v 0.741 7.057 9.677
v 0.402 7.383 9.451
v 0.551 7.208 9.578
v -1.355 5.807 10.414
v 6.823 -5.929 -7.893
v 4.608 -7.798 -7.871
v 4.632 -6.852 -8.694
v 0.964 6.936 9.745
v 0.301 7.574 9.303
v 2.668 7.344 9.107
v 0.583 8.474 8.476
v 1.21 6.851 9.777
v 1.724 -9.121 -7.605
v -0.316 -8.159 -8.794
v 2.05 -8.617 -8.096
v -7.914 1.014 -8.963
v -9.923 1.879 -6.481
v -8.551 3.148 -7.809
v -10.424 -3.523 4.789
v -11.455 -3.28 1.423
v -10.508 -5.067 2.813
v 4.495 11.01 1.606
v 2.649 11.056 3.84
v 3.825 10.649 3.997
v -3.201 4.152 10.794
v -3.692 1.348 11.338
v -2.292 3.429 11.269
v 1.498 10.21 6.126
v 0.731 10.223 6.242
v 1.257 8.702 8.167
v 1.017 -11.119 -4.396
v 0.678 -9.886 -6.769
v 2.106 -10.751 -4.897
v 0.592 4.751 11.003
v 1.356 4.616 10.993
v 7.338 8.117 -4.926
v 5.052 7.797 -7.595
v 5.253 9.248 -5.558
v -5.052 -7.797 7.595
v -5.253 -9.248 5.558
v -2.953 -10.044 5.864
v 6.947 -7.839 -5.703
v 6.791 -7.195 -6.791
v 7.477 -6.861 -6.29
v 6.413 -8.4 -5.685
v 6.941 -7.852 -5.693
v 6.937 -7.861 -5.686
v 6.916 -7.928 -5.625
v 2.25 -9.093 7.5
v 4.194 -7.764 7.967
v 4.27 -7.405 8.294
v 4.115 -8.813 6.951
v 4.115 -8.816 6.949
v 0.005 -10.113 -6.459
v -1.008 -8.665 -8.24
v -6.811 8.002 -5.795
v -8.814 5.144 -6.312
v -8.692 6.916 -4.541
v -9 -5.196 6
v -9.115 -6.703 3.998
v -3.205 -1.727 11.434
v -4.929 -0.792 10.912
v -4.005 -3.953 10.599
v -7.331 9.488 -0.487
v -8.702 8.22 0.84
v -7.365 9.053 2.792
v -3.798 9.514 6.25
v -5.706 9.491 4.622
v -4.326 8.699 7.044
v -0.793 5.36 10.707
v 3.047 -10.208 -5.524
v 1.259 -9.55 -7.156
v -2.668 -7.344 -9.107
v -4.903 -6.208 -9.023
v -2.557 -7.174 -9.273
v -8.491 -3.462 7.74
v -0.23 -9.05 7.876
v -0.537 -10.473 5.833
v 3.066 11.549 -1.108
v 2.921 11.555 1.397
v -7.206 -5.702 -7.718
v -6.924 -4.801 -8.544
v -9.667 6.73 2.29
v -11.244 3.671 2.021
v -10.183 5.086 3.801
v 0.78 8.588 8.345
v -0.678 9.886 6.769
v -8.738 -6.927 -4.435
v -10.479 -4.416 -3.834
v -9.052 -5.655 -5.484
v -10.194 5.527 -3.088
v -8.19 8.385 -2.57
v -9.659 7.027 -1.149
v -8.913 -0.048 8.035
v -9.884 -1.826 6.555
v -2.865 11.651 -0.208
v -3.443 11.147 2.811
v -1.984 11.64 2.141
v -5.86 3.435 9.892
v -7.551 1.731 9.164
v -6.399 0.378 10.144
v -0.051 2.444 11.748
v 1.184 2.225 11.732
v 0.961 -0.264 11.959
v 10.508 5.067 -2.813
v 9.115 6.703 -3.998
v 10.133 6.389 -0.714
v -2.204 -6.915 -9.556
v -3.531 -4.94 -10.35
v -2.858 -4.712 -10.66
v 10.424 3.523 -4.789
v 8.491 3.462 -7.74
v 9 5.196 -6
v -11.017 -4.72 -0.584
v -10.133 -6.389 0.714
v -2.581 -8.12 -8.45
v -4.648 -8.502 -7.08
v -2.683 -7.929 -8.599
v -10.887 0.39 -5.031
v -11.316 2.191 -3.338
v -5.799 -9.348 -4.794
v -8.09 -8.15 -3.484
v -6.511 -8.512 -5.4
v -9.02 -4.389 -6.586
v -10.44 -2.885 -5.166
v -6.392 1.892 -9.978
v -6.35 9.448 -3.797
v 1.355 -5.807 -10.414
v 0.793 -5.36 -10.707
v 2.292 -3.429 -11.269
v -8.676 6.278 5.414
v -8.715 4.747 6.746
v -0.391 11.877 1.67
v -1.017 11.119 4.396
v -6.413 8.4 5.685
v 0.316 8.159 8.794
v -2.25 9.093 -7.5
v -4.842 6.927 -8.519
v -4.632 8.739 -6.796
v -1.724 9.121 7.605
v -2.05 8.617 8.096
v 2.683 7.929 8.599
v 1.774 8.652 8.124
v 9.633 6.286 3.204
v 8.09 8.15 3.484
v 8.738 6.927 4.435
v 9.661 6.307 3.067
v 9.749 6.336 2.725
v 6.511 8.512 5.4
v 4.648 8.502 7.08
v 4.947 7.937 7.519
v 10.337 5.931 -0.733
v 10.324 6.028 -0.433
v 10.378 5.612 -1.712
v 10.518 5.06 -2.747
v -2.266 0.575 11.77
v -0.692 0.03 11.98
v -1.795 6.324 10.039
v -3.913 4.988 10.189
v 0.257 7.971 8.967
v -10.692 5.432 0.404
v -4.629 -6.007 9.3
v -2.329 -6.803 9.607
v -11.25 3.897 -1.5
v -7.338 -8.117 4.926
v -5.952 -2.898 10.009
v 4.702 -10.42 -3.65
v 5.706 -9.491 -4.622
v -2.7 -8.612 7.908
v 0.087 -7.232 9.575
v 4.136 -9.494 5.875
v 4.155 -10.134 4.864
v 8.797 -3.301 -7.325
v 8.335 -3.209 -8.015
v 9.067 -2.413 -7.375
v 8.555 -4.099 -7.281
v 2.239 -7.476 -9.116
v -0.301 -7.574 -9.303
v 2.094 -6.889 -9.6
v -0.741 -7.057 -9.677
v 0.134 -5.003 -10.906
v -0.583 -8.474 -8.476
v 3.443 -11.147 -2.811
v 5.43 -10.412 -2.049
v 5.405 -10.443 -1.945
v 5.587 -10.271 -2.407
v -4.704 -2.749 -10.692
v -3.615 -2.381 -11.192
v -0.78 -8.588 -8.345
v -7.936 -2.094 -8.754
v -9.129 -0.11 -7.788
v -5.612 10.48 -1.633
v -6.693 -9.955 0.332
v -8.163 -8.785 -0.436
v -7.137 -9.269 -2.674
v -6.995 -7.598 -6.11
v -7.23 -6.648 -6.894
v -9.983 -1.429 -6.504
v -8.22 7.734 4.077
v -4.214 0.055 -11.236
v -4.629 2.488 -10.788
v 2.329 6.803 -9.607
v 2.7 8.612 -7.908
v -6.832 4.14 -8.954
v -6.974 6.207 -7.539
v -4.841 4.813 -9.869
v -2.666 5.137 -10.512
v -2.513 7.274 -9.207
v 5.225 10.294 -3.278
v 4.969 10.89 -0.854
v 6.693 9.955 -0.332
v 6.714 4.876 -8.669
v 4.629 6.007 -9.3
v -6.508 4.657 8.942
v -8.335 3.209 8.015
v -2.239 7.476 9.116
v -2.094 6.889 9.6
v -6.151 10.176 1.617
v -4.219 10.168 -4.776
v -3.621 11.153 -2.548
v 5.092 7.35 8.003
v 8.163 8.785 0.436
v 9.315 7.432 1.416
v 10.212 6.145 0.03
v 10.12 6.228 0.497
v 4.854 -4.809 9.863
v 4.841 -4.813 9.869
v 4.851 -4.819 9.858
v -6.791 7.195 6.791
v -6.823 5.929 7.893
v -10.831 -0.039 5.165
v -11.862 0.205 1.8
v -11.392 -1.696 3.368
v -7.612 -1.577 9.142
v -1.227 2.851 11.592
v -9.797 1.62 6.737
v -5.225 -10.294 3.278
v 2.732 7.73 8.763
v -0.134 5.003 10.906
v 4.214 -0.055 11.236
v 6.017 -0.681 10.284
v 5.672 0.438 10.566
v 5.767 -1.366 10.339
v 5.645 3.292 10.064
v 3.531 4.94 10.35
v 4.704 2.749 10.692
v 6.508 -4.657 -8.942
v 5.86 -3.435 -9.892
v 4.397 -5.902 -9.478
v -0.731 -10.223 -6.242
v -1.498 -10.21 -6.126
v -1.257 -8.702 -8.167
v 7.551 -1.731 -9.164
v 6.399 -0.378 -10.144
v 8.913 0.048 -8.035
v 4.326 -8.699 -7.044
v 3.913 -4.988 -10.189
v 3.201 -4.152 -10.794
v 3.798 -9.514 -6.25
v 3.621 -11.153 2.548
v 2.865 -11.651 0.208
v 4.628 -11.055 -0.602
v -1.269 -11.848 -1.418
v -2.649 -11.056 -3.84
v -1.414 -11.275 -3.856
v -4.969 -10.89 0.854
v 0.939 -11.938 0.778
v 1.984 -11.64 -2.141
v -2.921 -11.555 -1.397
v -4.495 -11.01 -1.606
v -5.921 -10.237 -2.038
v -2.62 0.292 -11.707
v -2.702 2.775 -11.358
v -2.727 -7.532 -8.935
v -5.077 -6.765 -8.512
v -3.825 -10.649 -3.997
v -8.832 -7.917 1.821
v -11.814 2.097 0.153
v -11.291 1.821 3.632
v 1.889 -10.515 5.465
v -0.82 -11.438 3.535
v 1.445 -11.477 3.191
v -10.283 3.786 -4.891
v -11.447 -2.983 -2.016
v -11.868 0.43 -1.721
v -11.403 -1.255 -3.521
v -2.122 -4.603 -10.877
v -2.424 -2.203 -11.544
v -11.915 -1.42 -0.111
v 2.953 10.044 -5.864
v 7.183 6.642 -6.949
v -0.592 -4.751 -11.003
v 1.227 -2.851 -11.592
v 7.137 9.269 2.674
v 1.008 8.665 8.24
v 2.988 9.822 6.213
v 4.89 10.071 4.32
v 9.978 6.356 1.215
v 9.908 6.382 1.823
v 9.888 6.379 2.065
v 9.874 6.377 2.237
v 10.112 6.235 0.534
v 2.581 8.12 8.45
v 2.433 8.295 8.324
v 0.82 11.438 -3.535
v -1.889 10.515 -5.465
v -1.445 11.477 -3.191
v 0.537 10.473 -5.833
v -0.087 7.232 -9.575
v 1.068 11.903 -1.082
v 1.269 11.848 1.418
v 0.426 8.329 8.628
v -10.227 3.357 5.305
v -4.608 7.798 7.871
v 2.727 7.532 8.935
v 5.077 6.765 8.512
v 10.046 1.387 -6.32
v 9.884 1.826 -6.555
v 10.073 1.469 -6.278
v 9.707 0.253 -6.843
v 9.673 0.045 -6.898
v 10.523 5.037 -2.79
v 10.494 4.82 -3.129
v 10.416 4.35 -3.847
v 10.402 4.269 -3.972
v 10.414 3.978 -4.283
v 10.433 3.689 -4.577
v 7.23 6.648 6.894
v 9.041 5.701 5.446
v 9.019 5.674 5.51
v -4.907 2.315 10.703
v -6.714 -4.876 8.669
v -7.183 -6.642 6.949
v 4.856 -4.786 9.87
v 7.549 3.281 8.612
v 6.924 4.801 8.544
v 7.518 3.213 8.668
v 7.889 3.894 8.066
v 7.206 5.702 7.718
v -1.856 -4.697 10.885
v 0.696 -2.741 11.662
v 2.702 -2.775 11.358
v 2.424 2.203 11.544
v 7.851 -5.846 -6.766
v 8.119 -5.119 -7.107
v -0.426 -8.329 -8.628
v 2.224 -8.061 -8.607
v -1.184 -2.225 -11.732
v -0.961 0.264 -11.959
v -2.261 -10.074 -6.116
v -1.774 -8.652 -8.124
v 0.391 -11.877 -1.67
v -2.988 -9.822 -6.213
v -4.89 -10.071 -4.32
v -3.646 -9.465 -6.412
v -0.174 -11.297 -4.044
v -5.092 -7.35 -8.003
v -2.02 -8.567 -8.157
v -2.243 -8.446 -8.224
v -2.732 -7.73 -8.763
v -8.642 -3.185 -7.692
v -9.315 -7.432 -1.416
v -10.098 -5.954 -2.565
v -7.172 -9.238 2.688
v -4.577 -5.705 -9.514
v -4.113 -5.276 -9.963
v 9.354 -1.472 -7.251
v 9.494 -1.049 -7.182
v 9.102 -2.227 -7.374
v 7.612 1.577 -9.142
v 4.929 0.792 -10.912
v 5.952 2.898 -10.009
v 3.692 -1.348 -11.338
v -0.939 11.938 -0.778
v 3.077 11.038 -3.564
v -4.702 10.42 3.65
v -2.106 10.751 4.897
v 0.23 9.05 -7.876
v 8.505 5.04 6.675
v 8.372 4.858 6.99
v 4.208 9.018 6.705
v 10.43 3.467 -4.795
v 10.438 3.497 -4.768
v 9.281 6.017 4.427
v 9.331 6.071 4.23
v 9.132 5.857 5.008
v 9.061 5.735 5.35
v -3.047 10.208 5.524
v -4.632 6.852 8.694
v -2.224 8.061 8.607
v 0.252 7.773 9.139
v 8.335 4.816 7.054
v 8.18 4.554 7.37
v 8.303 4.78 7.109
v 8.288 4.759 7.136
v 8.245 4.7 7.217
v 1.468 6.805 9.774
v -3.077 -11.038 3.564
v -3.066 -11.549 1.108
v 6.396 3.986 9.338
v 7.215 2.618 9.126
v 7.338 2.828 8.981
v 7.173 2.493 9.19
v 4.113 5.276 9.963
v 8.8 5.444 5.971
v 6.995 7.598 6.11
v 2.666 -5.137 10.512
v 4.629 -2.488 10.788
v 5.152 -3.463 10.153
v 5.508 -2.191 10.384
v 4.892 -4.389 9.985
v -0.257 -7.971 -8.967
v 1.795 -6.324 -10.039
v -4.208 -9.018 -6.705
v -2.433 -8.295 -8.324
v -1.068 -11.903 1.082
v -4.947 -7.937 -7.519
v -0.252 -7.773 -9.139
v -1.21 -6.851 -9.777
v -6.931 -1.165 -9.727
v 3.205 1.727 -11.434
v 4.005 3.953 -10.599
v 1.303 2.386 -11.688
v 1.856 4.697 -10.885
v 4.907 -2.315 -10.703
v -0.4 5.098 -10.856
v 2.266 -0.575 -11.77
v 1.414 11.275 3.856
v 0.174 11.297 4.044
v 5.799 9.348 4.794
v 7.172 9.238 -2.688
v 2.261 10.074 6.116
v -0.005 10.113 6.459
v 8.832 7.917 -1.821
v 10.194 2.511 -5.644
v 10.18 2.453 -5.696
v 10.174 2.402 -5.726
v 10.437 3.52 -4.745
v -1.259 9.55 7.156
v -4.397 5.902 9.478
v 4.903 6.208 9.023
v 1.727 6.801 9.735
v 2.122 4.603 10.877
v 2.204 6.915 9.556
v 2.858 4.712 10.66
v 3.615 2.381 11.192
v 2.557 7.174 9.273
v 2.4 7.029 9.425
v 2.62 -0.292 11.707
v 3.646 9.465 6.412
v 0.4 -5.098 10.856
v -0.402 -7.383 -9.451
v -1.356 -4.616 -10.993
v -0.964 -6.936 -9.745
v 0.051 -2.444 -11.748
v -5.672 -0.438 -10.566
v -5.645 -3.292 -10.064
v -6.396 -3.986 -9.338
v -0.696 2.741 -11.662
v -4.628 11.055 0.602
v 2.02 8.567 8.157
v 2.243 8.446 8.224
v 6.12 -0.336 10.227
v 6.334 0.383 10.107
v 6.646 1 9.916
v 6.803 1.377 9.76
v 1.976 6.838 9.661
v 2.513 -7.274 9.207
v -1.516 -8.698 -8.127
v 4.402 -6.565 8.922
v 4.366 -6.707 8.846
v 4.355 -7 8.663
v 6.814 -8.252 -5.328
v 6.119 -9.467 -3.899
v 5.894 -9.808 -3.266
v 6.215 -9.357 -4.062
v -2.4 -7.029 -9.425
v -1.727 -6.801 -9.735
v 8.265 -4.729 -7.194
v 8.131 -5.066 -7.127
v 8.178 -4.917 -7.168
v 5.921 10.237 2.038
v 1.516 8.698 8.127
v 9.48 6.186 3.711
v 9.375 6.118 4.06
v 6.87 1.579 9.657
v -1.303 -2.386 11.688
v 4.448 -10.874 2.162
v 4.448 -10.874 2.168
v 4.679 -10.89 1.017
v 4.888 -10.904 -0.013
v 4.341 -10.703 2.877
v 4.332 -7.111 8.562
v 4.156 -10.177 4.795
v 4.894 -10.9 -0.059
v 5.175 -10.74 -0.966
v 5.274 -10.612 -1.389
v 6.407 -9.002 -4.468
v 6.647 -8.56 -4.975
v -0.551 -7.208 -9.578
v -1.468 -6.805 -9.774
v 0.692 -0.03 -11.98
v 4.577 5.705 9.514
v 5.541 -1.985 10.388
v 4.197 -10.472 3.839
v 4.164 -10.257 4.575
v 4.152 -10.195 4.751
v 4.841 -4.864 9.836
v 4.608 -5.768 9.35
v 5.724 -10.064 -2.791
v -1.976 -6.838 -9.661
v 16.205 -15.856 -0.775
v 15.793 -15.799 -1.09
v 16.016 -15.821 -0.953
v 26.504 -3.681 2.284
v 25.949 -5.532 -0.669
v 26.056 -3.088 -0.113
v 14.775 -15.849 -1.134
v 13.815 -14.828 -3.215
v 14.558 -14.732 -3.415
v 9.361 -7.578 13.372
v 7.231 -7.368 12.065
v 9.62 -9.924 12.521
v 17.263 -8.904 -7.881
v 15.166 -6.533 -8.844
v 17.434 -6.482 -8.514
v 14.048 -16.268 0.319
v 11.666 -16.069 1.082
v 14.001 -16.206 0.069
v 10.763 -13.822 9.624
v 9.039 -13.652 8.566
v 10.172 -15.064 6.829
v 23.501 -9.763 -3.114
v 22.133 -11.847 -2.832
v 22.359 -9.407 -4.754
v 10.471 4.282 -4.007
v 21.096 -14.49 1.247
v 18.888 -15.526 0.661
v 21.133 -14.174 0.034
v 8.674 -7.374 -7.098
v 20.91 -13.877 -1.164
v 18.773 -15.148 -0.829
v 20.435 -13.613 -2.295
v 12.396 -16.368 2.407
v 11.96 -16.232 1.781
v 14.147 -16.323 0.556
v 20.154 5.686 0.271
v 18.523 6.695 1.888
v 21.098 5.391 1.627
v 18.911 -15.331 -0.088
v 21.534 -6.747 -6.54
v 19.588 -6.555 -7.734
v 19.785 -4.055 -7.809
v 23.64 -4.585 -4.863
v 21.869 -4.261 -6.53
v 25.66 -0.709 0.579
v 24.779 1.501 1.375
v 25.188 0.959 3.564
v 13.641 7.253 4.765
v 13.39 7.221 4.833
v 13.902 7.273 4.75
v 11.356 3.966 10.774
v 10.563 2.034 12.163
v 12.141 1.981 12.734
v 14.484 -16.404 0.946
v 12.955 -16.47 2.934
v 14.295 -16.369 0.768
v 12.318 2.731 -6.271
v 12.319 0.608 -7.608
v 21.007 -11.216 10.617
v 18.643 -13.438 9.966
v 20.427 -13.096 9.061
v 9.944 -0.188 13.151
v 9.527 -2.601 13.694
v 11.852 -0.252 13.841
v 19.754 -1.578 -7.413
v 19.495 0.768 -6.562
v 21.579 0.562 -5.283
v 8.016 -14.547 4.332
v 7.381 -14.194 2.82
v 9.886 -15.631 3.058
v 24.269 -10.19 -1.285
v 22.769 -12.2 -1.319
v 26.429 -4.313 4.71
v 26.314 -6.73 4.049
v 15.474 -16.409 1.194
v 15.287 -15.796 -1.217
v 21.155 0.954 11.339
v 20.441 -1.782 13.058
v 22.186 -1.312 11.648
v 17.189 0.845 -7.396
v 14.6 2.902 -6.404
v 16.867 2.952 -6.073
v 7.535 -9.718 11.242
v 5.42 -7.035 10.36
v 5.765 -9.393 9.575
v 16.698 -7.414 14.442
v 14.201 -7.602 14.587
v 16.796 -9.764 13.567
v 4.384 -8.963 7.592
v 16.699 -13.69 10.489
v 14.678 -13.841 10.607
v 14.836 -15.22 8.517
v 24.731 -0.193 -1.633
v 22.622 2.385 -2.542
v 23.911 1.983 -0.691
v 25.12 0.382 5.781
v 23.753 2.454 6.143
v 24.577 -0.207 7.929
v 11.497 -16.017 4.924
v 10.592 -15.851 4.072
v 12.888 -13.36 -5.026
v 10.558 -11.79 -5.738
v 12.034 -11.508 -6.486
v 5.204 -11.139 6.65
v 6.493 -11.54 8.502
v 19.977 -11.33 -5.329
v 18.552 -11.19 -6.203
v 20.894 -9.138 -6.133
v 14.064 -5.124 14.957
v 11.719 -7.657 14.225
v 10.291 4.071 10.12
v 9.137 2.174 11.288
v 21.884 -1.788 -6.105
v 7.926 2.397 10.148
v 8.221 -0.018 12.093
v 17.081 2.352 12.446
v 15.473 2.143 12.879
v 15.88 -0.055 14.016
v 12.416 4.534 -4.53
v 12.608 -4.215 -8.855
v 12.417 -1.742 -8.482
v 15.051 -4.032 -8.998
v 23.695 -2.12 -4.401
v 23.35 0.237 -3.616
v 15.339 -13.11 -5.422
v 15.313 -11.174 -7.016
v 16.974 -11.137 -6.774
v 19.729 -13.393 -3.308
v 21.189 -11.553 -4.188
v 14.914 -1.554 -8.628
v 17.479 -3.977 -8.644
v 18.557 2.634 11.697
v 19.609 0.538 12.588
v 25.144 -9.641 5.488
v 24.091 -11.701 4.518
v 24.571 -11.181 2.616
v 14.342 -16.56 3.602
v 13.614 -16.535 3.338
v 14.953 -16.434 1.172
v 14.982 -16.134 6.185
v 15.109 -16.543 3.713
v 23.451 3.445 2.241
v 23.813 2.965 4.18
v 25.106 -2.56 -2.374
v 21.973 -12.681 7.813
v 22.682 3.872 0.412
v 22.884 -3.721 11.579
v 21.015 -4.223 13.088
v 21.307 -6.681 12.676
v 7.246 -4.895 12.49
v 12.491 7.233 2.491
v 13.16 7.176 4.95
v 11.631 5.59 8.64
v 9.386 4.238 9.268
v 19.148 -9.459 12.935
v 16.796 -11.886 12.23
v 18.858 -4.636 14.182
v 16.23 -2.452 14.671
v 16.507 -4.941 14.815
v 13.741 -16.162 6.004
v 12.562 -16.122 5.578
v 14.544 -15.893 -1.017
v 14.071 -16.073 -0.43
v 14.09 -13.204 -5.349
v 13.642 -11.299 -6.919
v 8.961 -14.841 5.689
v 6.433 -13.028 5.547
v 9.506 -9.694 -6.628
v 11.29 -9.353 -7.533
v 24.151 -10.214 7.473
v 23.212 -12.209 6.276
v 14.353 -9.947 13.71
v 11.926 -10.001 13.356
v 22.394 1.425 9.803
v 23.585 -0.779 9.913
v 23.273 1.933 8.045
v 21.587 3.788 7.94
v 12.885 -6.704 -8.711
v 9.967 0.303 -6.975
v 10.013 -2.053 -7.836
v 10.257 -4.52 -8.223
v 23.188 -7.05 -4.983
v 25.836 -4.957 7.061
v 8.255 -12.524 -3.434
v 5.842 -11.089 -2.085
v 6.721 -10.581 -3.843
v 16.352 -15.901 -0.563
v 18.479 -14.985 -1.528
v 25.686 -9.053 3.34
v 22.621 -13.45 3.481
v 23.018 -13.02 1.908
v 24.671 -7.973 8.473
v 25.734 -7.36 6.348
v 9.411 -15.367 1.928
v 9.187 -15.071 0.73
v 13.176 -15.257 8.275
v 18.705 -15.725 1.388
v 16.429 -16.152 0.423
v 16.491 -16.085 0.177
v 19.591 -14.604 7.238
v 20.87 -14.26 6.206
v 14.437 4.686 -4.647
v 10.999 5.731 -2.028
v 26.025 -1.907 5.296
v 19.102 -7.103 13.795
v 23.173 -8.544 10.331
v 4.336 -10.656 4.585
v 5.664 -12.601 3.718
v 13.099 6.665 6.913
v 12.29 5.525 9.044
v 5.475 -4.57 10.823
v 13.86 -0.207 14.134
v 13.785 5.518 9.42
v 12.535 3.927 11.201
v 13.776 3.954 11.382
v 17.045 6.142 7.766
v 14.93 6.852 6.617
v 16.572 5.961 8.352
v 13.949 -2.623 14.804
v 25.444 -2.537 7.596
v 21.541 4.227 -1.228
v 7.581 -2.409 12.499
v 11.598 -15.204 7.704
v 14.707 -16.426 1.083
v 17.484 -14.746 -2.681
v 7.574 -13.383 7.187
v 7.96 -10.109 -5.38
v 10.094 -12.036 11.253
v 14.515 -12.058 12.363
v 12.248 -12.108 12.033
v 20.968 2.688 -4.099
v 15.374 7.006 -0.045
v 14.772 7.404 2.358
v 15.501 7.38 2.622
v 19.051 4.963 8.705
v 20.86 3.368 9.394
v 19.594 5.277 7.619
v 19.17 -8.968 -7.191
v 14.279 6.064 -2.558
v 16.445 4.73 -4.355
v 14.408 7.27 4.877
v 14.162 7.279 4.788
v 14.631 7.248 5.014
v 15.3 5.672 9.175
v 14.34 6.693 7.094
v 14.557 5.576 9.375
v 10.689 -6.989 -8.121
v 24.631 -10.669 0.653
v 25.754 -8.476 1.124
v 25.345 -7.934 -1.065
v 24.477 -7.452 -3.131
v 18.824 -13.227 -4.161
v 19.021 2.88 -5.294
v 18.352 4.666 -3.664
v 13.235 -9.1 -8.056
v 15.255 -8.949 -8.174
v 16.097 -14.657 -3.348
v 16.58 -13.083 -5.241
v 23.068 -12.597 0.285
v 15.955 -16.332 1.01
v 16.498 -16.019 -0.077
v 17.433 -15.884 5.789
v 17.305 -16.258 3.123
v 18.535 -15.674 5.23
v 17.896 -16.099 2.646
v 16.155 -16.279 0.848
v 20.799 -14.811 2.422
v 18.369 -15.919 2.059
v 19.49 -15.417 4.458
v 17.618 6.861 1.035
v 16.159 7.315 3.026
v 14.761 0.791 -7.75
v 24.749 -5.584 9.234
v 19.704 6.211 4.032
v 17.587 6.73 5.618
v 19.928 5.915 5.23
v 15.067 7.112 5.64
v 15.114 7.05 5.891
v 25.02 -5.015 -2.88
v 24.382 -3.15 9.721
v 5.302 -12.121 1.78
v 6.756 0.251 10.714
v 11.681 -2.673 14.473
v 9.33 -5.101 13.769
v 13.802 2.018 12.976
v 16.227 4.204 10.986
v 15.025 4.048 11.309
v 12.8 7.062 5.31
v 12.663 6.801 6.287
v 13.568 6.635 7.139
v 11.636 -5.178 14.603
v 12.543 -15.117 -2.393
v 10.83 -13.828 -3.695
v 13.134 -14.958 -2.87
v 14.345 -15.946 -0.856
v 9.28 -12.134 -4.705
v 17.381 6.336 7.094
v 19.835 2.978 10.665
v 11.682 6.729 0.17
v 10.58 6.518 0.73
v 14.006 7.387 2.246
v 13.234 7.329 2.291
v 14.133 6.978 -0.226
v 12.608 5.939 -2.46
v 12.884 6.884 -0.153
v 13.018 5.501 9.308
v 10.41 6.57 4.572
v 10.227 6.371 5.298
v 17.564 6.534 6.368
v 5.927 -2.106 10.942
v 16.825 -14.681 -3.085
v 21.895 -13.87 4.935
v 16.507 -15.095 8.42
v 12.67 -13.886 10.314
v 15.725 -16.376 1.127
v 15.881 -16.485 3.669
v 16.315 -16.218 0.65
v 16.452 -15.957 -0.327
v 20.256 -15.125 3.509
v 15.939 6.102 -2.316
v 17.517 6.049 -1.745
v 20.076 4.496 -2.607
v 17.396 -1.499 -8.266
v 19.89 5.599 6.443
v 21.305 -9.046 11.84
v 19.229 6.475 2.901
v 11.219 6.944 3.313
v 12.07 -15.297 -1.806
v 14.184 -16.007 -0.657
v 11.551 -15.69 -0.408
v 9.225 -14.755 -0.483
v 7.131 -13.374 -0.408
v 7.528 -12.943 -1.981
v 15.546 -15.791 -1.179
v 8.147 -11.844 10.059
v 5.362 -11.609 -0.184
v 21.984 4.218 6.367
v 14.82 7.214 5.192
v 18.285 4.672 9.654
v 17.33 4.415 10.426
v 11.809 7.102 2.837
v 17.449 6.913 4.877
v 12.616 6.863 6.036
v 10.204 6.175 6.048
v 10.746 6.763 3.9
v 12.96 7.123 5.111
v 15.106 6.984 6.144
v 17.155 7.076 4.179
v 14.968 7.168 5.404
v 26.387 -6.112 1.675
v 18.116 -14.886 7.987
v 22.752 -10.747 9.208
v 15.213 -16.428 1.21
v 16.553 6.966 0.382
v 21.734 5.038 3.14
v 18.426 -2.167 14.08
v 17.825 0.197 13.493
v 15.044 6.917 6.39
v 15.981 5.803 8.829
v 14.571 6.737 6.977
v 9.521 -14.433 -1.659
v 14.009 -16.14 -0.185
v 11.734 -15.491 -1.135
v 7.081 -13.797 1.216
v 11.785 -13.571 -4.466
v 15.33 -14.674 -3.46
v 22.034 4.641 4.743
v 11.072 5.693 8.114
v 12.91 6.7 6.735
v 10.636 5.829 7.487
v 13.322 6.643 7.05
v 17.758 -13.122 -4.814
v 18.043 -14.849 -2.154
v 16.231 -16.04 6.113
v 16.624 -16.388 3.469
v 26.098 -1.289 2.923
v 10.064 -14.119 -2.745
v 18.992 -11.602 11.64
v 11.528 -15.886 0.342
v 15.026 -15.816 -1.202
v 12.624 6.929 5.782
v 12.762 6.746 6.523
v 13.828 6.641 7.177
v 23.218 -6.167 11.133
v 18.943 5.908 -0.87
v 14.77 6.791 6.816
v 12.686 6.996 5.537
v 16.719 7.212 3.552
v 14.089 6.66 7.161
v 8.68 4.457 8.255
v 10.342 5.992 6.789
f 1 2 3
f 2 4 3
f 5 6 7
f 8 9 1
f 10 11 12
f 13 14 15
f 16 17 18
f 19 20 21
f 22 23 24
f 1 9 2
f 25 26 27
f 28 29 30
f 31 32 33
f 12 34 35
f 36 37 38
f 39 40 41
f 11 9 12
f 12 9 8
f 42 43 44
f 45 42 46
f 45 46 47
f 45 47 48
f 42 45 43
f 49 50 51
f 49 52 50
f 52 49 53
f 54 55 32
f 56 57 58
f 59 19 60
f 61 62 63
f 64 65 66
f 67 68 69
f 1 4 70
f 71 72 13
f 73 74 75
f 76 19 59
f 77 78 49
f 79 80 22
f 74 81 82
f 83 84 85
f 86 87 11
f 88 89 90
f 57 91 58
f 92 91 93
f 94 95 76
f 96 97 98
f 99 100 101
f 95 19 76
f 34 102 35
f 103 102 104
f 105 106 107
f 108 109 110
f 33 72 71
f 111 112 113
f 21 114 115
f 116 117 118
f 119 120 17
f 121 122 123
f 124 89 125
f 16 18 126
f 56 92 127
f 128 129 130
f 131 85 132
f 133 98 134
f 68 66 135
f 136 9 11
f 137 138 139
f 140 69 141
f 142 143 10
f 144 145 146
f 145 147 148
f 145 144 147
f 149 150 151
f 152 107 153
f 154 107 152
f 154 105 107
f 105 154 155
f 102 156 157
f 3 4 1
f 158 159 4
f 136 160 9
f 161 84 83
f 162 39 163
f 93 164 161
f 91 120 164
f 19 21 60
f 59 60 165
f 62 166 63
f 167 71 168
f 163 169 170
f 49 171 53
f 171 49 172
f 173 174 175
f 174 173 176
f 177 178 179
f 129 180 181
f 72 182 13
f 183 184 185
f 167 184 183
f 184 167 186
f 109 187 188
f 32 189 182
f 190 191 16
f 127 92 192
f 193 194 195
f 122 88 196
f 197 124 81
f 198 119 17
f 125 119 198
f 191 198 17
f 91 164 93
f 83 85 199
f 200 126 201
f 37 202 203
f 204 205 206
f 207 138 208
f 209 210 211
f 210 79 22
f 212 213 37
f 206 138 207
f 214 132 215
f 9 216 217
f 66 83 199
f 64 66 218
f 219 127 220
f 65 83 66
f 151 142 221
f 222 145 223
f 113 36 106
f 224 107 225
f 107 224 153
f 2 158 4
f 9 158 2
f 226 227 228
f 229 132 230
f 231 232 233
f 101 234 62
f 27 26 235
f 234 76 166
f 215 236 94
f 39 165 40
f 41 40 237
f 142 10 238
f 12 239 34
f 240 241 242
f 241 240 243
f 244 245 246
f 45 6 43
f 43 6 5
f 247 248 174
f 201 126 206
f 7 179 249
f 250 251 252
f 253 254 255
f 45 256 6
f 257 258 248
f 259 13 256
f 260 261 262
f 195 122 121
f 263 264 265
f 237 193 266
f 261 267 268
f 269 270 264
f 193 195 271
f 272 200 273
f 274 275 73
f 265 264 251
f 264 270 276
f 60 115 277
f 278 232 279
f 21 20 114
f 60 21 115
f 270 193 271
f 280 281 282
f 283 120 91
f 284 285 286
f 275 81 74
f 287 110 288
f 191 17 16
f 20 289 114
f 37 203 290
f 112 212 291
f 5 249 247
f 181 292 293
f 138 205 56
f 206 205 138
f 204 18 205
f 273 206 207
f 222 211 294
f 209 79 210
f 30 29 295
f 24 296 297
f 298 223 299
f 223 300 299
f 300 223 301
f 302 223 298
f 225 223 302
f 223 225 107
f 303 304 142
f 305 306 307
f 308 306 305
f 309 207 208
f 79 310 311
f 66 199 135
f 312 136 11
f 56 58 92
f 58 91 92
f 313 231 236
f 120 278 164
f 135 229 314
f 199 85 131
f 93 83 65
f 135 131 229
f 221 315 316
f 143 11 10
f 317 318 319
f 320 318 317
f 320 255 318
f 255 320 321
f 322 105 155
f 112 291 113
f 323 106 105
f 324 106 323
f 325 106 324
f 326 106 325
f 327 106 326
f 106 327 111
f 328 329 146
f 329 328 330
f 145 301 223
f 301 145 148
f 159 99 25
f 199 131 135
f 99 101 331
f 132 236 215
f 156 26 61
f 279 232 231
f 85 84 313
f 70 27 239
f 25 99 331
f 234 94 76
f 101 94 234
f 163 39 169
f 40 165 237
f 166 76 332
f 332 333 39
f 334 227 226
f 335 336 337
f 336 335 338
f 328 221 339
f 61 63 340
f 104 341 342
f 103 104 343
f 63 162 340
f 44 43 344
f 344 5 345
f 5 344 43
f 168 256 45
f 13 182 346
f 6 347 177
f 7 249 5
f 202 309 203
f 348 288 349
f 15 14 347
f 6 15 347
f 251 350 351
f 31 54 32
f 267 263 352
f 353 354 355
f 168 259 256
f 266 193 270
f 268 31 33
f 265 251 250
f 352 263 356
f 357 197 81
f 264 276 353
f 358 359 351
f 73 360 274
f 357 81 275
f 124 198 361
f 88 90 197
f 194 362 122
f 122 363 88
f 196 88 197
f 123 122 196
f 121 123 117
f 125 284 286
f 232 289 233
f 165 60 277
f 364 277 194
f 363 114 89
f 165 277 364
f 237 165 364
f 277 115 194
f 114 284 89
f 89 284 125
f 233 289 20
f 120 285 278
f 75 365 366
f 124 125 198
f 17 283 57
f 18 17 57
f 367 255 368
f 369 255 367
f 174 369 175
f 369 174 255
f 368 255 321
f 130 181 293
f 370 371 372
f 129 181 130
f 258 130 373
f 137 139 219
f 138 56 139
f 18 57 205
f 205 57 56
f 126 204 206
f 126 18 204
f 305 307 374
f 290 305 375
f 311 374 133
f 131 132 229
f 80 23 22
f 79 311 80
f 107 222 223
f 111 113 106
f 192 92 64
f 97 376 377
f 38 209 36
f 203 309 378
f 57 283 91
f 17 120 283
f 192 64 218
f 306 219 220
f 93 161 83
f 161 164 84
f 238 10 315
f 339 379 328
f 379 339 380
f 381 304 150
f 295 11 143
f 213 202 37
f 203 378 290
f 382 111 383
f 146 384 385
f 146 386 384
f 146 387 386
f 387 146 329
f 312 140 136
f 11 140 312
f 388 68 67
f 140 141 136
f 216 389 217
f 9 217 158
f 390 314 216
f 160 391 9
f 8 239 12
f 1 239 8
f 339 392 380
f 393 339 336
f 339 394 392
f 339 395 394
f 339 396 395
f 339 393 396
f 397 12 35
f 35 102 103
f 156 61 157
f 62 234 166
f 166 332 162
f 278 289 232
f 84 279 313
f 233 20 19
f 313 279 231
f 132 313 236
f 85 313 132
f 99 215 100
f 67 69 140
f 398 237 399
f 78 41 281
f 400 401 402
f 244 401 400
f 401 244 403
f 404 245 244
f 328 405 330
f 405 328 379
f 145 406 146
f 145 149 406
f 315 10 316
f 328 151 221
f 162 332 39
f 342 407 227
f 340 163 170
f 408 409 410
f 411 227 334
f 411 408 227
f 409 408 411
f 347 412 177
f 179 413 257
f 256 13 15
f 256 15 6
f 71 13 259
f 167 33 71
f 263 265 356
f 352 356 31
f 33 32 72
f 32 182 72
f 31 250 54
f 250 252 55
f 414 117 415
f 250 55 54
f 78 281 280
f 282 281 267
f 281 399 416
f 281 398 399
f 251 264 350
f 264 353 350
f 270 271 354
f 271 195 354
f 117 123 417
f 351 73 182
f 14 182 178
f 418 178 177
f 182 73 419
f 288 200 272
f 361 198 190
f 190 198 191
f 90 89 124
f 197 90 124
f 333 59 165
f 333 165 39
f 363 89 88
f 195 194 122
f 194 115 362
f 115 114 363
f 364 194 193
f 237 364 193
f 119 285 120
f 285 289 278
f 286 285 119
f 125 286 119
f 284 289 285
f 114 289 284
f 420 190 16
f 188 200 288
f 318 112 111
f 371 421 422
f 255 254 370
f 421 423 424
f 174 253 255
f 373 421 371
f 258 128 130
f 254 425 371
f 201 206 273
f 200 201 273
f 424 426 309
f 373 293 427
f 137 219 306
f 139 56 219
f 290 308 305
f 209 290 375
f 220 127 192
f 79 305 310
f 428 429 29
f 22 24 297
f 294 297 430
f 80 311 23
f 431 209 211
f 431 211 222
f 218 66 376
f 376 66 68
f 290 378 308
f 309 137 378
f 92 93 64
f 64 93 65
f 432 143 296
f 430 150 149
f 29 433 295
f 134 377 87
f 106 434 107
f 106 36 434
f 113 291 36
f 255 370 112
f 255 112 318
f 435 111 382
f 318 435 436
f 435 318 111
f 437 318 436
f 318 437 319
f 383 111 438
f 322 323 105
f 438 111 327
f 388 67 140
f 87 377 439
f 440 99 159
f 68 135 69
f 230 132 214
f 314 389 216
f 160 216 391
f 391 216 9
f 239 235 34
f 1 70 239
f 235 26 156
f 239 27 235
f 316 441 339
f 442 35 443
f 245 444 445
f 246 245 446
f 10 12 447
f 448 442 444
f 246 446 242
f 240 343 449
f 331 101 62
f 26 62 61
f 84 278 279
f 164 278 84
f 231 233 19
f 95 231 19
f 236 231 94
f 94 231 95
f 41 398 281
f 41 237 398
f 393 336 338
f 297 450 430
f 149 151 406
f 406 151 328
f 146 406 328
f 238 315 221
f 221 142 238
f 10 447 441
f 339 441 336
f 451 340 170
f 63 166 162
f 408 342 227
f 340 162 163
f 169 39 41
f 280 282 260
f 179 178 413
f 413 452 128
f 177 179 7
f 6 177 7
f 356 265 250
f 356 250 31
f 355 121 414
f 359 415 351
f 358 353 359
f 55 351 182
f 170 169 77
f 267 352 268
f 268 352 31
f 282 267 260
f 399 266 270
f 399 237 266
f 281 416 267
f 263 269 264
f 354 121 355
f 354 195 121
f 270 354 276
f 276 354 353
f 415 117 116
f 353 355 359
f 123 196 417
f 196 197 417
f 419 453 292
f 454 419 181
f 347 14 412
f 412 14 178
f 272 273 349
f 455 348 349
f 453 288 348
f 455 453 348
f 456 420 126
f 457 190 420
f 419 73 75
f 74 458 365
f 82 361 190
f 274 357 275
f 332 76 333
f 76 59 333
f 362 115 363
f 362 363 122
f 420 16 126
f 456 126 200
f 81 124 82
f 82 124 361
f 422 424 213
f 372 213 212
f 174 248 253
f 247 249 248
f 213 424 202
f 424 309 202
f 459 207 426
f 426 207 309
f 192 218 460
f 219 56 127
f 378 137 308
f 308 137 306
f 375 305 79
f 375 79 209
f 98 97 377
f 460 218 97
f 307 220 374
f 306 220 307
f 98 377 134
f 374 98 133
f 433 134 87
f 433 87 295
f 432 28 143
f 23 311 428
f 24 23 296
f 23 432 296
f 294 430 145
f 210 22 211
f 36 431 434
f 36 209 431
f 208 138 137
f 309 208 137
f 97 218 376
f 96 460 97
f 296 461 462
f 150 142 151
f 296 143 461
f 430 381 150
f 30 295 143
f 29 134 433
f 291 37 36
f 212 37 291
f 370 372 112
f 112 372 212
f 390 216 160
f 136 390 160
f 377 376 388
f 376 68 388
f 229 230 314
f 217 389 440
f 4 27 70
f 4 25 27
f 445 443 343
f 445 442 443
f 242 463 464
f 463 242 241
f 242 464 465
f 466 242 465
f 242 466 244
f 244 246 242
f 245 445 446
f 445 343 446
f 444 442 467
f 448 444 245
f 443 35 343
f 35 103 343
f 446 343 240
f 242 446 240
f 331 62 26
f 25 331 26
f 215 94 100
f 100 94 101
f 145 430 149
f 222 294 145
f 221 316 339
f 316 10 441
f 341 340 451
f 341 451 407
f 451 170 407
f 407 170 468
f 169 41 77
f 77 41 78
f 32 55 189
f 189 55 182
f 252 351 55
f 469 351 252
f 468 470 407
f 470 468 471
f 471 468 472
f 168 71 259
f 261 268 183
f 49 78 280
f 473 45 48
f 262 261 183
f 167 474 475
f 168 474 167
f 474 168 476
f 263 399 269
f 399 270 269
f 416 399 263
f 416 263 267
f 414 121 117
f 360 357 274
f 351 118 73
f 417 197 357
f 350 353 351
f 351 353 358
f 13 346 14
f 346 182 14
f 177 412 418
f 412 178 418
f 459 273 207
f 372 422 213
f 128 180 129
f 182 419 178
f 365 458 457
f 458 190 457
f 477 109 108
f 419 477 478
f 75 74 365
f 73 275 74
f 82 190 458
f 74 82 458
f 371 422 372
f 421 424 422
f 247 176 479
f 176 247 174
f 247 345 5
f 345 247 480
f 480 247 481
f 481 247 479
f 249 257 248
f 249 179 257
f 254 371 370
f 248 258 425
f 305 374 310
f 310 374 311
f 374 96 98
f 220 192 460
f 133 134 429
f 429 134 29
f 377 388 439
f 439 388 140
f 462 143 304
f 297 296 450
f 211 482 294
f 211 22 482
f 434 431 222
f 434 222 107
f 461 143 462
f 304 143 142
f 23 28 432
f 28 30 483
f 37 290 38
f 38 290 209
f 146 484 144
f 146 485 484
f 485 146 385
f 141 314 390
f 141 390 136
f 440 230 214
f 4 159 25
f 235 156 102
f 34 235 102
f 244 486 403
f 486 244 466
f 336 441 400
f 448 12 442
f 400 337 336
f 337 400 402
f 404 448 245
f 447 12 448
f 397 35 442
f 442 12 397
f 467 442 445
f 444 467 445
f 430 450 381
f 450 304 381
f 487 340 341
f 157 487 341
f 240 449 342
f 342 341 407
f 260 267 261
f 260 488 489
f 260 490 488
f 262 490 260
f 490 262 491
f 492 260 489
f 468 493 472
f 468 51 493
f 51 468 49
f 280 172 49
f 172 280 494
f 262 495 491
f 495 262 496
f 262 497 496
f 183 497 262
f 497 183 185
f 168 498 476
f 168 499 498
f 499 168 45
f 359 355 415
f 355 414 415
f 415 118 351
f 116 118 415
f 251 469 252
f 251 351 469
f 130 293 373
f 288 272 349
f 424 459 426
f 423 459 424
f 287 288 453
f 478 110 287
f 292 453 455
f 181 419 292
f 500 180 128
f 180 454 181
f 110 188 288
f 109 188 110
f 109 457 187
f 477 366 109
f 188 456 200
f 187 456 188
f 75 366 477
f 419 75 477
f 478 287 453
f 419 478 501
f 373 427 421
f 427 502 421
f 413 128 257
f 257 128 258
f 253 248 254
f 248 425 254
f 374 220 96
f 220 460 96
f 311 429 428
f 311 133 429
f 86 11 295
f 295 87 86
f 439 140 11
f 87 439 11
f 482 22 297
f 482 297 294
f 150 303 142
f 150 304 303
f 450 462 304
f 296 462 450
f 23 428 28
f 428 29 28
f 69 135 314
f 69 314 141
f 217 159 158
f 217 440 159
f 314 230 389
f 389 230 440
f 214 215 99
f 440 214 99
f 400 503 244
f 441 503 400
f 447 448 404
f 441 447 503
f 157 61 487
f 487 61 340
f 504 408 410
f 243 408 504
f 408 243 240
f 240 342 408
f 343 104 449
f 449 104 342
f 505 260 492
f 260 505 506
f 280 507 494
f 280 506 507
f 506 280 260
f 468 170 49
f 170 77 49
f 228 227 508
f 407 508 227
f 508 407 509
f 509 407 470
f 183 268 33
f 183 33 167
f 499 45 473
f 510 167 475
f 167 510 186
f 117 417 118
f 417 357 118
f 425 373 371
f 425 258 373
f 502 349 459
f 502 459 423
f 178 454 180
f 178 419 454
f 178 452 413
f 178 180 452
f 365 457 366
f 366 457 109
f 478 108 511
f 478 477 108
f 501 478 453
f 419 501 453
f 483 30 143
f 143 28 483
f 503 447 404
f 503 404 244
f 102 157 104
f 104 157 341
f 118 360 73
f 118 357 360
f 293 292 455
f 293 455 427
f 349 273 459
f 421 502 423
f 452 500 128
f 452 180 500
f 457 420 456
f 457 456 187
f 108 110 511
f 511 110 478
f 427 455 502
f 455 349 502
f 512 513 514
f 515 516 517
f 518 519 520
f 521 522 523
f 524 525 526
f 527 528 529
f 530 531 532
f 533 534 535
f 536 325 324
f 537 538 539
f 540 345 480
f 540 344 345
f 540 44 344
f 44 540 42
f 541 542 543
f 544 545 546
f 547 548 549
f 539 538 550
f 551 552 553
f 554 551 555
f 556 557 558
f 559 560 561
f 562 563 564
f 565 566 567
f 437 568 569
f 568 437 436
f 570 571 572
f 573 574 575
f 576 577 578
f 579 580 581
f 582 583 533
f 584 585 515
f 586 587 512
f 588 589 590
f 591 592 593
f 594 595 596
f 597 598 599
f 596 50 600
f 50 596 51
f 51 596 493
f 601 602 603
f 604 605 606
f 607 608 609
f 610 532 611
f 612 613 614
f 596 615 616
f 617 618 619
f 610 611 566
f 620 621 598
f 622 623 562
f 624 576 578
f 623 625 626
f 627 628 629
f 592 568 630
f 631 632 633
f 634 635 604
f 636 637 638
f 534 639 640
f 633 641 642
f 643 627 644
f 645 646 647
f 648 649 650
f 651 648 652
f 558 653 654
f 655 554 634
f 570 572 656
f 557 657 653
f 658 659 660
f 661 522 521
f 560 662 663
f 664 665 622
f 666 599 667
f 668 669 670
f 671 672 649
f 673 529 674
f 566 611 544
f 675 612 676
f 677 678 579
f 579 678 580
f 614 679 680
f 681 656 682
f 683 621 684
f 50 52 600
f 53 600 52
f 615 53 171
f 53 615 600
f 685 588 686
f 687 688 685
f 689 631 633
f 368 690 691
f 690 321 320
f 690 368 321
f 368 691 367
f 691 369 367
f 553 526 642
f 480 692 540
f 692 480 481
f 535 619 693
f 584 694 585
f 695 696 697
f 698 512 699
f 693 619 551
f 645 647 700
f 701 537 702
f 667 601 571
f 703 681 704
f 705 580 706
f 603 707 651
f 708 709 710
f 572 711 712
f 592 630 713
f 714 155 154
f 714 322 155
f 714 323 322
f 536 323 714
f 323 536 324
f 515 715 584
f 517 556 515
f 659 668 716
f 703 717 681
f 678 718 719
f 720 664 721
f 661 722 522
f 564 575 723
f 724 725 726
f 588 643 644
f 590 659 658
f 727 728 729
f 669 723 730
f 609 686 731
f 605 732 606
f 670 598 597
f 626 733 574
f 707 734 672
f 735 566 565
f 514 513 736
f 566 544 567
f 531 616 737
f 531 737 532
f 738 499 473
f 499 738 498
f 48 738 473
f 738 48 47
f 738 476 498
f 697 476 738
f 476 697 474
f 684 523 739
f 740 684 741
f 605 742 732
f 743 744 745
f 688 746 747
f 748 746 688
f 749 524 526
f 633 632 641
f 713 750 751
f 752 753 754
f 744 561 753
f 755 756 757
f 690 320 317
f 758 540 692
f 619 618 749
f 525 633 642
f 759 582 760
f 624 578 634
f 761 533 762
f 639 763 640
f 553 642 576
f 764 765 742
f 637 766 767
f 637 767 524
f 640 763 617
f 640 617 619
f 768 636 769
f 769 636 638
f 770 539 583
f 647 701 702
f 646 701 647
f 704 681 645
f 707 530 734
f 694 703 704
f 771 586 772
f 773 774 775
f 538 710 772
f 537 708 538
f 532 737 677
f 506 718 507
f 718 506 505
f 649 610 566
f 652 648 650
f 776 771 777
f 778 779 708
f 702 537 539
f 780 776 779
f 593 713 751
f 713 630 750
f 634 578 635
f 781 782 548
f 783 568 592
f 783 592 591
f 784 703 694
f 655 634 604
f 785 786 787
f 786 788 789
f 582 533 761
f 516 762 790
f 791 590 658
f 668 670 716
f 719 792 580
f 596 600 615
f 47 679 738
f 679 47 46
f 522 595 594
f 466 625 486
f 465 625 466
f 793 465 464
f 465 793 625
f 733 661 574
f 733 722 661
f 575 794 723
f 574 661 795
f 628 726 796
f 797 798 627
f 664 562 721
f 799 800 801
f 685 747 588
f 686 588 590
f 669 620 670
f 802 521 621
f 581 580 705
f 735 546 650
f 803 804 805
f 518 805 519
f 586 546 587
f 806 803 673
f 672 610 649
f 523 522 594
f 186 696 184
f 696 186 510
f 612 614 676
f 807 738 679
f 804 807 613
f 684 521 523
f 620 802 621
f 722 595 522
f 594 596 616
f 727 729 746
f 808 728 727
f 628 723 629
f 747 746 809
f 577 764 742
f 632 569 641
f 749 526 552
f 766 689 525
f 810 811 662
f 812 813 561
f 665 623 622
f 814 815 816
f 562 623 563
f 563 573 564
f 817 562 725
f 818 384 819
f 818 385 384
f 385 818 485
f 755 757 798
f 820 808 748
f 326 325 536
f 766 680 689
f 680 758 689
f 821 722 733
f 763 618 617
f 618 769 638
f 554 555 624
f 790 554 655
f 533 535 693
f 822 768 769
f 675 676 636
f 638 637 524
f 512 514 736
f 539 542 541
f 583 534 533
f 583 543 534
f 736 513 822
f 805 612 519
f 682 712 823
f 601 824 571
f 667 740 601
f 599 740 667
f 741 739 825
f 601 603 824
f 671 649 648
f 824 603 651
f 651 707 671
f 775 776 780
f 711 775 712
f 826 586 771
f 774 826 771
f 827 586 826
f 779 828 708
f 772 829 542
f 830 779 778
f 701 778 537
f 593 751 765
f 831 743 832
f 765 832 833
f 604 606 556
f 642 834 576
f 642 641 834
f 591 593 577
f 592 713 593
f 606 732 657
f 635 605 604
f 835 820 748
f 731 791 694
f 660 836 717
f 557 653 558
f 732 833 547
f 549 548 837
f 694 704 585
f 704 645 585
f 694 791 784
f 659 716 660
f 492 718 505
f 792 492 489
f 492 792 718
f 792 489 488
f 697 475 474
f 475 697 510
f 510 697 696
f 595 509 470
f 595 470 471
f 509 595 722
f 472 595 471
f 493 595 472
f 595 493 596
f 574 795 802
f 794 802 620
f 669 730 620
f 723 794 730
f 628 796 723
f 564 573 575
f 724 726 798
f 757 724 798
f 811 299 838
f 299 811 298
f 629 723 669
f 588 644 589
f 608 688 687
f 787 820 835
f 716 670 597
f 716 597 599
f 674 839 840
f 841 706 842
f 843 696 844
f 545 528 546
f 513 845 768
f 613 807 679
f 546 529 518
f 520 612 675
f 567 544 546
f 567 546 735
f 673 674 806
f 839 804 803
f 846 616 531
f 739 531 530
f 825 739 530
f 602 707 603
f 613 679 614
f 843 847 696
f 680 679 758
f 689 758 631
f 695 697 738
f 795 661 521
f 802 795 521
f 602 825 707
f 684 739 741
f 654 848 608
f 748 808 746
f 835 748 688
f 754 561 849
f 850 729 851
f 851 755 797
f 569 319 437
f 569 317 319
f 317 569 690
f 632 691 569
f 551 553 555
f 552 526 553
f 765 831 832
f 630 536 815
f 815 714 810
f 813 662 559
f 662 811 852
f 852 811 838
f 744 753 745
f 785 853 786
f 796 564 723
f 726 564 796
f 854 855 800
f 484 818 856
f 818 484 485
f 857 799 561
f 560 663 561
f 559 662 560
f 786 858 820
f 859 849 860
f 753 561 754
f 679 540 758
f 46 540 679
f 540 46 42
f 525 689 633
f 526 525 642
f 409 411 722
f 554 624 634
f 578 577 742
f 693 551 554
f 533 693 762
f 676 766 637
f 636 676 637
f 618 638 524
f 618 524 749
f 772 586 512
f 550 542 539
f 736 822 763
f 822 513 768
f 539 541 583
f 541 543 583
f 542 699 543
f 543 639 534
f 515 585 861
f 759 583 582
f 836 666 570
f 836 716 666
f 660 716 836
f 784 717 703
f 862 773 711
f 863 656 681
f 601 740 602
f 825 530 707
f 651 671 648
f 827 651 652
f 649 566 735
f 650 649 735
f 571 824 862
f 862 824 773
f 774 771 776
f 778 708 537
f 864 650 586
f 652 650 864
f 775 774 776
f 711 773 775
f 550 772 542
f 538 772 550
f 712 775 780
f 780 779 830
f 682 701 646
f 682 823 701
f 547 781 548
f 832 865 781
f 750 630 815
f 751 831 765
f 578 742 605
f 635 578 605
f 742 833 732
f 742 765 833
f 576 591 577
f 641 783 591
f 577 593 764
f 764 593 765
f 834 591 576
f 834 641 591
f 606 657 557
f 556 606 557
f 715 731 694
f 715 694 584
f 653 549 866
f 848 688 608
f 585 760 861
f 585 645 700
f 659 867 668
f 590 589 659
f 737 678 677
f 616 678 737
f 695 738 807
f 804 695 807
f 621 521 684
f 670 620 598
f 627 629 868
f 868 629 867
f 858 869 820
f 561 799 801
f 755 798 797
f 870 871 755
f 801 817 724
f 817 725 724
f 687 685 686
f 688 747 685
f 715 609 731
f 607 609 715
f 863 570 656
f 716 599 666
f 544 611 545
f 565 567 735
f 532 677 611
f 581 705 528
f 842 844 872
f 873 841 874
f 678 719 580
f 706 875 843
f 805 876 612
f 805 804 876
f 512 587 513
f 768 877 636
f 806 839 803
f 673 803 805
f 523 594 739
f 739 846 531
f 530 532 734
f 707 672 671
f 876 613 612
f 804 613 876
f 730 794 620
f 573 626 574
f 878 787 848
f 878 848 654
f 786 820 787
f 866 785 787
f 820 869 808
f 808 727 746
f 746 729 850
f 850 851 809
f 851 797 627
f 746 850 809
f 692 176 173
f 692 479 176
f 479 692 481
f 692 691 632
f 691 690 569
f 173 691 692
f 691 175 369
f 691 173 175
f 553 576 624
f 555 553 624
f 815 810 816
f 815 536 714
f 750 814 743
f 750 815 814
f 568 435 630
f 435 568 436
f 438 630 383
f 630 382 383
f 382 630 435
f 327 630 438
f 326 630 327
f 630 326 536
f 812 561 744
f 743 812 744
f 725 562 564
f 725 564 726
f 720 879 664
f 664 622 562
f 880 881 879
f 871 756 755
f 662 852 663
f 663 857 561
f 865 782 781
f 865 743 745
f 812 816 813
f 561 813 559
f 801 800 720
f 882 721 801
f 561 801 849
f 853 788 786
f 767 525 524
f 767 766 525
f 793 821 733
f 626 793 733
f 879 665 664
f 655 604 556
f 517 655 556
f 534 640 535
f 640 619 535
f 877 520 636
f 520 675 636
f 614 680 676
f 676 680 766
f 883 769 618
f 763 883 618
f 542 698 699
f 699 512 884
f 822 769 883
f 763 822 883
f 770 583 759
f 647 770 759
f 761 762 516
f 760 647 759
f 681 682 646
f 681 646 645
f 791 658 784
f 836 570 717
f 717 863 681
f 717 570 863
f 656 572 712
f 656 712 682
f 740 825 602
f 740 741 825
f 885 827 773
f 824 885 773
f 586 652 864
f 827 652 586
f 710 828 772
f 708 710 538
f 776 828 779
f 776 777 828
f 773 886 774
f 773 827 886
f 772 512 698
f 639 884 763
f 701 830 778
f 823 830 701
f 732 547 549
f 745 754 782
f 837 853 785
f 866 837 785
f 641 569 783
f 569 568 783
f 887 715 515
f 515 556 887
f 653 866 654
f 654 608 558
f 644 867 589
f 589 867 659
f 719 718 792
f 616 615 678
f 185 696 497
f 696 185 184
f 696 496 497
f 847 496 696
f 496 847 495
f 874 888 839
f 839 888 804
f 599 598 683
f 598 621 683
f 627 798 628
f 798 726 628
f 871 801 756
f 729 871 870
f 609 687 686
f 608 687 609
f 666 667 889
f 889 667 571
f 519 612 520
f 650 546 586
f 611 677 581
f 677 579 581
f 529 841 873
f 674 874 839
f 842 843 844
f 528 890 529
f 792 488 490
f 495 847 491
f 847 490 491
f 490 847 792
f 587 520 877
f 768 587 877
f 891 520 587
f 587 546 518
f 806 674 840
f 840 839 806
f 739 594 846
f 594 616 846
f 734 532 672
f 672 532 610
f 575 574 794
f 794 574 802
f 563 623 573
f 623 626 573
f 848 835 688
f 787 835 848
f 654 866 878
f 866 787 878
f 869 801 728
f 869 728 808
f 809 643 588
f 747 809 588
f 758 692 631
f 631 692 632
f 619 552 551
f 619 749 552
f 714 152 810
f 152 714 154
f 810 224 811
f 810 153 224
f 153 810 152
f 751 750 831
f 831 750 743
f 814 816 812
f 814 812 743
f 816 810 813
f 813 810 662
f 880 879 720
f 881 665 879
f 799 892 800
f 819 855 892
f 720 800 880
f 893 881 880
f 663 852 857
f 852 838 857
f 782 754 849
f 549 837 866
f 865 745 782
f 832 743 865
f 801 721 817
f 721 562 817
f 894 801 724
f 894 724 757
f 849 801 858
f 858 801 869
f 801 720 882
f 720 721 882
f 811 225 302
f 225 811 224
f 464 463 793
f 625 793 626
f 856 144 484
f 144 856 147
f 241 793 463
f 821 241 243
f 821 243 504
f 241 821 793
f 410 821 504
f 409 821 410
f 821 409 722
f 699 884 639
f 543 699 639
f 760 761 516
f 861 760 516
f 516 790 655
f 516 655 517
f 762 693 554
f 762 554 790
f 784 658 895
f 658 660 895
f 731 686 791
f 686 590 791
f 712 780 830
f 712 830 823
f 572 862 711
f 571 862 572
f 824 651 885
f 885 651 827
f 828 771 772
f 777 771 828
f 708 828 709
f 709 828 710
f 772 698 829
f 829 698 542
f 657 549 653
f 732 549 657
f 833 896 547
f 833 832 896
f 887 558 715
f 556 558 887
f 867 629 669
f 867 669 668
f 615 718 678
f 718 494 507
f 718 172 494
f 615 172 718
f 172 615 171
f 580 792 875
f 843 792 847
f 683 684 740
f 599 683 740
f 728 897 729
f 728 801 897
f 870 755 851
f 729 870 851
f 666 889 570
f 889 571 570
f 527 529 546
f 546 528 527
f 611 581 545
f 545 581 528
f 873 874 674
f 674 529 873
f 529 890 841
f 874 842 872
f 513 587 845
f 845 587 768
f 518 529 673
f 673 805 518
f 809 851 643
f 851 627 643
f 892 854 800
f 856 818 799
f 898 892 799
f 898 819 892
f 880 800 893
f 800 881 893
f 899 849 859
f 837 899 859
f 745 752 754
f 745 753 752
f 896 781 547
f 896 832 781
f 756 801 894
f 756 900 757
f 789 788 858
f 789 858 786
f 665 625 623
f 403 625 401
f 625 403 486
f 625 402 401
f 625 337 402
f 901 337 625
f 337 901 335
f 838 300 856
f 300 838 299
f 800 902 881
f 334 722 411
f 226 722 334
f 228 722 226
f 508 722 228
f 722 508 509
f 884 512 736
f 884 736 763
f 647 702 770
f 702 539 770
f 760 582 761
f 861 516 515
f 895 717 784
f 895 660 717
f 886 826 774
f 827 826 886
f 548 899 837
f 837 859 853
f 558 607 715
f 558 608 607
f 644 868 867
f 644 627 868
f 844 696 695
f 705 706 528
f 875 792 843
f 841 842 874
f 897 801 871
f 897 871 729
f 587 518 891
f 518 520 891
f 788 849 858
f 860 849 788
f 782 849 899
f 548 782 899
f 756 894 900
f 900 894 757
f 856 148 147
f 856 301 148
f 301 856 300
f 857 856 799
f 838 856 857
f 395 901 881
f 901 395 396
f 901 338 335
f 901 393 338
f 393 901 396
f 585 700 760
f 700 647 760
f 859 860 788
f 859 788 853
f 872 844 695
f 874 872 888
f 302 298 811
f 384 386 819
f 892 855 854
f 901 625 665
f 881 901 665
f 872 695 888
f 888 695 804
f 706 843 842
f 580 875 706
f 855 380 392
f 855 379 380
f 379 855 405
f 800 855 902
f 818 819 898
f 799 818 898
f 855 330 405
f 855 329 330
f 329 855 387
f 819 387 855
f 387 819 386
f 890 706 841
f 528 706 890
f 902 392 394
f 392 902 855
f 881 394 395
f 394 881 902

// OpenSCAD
union() {
	rotate(a = [30, 330, 210]) {
		color(c = [0.2066476461, 0.3735392451, 0.9255845821]) {
			sphere(r = 12.0000000000);
		}
	}
	rotate(a = [300, 120, 210]) {
		translate(v = [2.57850848895, 14.6505554407, 4.52411374061]) {
			color(c = [0.4784844767, 0.7419962858, 0.7978875862]) {
				sphere(r = 12.0000000000);
			}
		}
	}
}
